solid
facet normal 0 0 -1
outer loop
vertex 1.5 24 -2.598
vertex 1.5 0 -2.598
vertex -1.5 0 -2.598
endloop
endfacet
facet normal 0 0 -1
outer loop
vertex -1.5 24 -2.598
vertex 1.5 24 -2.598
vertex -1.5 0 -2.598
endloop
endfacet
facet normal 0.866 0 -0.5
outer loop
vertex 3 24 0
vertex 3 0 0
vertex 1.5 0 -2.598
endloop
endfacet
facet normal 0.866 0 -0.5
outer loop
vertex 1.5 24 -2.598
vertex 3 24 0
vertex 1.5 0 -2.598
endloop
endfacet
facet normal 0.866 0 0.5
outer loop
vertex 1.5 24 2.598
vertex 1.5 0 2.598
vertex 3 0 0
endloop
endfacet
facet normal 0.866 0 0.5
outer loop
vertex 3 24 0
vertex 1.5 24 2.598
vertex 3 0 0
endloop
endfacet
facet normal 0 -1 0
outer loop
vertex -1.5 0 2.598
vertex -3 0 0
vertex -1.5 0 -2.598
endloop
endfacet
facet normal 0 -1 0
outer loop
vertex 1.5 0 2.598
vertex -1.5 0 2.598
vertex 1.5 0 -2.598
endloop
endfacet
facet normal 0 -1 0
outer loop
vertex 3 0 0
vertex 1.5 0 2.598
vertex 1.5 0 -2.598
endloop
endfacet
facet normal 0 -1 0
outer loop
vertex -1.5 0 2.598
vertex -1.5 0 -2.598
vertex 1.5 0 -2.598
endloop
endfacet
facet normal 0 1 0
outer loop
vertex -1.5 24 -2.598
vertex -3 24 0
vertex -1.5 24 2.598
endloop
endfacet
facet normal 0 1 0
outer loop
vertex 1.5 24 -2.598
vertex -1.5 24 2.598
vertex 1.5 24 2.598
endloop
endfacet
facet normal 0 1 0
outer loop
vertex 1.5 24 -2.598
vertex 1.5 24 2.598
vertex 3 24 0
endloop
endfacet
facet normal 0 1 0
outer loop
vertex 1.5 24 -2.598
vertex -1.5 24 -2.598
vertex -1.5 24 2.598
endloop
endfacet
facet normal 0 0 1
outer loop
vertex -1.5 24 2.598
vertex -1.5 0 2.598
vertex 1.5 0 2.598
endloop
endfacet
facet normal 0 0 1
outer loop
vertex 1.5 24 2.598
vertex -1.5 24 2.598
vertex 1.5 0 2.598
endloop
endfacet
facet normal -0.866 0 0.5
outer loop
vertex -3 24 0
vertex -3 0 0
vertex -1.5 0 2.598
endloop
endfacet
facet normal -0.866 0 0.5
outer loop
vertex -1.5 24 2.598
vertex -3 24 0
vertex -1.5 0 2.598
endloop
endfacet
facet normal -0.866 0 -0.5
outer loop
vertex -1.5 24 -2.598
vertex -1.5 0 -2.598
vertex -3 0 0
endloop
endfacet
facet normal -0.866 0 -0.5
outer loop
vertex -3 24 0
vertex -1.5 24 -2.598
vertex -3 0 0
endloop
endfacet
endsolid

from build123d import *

# Parameters (mm, degrees)
BOSS_EXTRU_1_DEPTH = 24


with BuildPart() as part:
    # Esquisse3 → Boss.-Extru.1 (new body)
    with BuildSketch(Plane(origin=(0, 0, 0), x_dir=(1, 0, 0), z_dir=(0, 1, 0))):
        Polygon((3, 0), (1.5, 2.598076211), (-1.5, 2.598076211), (-3, 0), (-1.5, -2.598076211), (1.5, -2.598076211), align=None)
    extrude(amount=BOSS_EXTRU_1_DEPTH)


solid = part.part
